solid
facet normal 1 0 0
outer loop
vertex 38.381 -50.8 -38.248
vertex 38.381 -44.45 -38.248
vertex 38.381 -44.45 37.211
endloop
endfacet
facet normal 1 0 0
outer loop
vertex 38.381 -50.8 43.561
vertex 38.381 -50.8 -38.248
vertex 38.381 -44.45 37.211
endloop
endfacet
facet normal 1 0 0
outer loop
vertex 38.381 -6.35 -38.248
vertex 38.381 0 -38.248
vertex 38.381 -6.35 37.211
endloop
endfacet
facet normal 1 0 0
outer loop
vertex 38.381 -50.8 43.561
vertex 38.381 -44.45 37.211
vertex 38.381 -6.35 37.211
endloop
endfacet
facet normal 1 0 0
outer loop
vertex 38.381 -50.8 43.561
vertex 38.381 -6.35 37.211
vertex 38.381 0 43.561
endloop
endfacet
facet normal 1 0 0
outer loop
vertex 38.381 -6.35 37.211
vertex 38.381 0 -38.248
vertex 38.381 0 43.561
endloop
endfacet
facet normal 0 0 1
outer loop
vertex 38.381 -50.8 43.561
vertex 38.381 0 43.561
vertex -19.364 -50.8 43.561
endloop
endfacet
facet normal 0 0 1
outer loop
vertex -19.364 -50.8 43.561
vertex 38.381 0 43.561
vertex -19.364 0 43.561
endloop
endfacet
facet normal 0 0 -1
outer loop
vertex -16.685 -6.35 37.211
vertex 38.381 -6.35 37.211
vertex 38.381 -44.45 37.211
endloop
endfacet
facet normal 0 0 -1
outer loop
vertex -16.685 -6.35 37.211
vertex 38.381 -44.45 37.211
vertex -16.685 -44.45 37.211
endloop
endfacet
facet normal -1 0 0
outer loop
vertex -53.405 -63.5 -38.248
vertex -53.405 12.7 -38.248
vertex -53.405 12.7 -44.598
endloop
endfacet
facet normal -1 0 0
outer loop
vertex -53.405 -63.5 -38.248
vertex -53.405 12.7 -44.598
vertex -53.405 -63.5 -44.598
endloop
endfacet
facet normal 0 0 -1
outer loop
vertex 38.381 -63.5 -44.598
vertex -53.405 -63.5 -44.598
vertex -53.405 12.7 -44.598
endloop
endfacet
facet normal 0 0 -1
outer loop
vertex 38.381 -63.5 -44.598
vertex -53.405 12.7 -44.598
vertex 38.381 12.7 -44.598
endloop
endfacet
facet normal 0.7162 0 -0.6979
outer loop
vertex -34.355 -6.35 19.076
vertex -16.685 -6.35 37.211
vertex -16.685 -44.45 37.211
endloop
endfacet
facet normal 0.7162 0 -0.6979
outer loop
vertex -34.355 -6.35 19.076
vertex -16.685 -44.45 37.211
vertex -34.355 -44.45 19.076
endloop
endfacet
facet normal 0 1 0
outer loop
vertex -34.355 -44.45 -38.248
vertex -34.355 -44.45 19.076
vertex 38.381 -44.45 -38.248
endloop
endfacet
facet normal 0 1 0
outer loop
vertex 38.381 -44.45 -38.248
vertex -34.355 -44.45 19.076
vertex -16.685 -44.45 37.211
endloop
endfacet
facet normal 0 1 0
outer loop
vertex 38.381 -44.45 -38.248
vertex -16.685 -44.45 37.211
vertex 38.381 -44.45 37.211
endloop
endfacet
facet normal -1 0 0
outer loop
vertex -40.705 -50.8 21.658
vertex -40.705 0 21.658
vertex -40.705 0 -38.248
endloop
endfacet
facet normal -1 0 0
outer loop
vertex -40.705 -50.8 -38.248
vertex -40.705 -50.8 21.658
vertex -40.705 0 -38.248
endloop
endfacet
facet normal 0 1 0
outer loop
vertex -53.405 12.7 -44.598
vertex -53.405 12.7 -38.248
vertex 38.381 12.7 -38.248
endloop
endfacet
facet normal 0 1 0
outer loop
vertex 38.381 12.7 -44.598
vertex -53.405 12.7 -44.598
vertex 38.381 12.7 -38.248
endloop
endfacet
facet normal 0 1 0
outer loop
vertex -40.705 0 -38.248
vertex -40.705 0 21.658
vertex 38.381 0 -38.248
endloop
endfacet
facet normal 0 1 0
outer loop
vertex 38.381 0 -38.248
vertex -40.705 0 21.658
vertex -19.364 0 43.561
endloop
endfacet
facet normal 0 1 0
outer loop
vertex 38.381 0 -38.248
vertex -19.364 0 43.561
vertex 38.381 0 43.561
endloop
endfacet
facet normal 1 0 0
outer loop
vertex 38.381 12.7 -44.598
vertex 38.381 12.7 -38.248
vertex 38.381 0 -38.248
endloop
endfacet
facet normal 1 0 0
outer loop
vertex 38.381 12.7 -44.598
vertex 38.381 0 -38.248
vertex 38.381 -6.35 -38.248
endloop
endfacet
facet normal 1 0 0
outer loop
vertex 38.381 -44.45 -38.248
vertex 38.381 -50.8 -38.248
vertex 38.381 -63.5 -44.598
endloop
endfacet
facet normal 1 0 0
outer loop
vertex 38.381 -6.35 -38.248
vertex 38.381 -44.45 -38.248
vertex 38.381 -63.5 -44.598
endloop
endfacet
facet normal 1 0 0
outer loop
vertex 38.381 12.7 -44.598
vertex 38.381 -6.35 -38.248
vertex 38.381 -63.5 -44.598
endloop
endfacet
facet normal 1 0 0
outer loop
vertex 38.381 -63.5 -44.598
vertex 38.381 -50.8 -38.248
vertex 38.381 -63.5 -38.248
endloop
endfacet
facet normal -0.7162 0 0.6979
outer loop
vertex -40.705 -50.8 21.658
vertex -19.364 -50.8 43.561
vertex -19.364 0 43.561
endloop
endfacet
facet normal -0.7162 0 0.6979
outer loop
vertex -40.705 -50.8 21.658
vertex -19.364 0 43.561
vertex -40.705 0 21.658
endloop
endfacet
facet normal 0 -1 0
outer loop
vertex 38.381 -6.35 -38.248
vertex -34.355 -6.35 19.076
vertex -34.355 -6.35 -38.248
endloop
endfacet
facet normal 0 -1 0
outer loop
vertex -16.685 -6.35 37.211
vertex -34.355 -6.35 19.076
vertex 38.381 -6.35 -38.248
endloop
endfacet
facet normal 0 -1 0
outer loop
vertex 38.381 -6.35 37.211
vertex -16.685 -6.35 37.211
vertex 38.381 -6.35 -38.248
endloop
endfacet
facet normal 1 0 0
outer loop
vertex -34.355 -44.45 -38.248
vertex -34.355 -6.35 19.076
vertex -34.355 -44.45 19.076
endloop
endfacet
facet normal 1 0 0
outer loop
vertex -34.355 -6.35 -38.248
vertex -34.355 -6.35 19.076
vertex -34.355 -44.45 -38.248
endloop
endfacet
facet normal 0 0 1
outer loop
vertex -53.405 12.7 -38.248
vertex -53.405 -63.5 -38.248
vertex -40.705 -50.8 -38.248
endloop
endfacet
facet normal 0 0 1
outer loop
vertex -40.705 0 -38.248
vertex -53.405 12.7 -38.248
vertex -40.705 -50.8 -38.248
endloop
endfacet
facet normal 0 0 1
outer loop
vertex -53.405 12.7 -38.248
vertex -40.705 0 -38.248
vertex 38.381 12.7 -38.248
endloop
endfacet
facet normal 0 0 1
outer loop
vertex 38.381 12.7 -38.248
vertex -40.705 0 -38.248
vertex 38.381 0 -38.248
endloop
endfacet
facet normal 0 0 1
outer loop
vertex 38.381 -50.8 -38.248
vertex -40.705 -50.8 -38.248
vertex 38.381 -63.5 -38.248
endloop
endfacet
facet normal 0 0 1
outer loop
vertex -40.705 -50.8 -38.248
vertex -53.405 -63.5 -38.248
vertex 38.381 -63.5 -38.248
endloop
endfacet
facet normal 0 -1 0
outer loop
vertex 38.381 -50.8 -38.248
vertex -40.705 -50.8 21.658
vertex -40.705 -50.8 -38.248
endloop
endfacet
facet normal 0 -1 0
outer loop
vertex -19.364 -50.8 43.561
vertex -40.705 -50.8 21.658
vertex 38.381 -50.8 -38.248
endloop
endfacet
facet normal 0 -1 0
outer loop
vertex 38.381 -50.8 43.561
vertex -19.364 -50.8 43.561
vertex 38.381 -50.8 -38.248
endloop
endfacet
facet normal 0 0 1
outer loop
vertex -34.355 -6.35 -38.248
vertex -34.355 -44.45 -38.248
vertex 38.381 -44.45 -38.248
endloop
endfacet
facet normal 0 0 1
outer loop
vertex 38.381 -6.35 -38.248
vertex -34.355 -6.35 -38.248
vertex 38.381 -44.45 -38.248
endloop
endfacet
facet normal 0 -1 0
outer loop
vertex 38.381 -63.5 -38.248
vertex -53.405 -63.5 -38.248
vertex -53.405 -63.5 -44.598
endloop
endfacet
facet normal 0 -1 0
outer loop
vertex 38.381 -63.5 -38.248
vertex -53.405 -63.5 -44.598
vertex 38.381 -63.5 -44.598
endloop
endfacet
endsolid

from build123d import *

# Parameters (mm, degrees)
F1_DEPTH = 50.8
F2_T     = -6.35
F3_W     = 91.786147
F3_H     = 76.2
F4_DEPTH = 6.35


with BuildPart() as f1:
    # F0 (on Front) → F1 (new body)
    with BuildSketch(Plane.XZ):
        Polygon((38.380861, 43.561175), (-19.363867, 43.561175), (-40.705286, 21.657981), (-40.705286, -38.248271), (38.380861, -38.248271), align=None)
    extrude(amount=F1_DEPTH)

    # F2
    f2_openings = [f1.faces().sort_by_distance(p)[0] for p in [
        (38.380861, -25.4, 2.656452),
        (-1.162212, -25.4, -38.248271),
    ]]
    offset(amount=F2_T, openings=f2_openings)

    # F3 (on face) → F4 (join)
    with BuildSketch(Plane(origin=(0, 0, -38.248271), x_dir=(1, 0, 0), z_dir=(0, 0, -1))):
        with Locations((-7.512213, 25.4)):
            Rectangle(F3_W, F3_H)
    extrude(amount=F4_DEPTH)


solid = f1.part
